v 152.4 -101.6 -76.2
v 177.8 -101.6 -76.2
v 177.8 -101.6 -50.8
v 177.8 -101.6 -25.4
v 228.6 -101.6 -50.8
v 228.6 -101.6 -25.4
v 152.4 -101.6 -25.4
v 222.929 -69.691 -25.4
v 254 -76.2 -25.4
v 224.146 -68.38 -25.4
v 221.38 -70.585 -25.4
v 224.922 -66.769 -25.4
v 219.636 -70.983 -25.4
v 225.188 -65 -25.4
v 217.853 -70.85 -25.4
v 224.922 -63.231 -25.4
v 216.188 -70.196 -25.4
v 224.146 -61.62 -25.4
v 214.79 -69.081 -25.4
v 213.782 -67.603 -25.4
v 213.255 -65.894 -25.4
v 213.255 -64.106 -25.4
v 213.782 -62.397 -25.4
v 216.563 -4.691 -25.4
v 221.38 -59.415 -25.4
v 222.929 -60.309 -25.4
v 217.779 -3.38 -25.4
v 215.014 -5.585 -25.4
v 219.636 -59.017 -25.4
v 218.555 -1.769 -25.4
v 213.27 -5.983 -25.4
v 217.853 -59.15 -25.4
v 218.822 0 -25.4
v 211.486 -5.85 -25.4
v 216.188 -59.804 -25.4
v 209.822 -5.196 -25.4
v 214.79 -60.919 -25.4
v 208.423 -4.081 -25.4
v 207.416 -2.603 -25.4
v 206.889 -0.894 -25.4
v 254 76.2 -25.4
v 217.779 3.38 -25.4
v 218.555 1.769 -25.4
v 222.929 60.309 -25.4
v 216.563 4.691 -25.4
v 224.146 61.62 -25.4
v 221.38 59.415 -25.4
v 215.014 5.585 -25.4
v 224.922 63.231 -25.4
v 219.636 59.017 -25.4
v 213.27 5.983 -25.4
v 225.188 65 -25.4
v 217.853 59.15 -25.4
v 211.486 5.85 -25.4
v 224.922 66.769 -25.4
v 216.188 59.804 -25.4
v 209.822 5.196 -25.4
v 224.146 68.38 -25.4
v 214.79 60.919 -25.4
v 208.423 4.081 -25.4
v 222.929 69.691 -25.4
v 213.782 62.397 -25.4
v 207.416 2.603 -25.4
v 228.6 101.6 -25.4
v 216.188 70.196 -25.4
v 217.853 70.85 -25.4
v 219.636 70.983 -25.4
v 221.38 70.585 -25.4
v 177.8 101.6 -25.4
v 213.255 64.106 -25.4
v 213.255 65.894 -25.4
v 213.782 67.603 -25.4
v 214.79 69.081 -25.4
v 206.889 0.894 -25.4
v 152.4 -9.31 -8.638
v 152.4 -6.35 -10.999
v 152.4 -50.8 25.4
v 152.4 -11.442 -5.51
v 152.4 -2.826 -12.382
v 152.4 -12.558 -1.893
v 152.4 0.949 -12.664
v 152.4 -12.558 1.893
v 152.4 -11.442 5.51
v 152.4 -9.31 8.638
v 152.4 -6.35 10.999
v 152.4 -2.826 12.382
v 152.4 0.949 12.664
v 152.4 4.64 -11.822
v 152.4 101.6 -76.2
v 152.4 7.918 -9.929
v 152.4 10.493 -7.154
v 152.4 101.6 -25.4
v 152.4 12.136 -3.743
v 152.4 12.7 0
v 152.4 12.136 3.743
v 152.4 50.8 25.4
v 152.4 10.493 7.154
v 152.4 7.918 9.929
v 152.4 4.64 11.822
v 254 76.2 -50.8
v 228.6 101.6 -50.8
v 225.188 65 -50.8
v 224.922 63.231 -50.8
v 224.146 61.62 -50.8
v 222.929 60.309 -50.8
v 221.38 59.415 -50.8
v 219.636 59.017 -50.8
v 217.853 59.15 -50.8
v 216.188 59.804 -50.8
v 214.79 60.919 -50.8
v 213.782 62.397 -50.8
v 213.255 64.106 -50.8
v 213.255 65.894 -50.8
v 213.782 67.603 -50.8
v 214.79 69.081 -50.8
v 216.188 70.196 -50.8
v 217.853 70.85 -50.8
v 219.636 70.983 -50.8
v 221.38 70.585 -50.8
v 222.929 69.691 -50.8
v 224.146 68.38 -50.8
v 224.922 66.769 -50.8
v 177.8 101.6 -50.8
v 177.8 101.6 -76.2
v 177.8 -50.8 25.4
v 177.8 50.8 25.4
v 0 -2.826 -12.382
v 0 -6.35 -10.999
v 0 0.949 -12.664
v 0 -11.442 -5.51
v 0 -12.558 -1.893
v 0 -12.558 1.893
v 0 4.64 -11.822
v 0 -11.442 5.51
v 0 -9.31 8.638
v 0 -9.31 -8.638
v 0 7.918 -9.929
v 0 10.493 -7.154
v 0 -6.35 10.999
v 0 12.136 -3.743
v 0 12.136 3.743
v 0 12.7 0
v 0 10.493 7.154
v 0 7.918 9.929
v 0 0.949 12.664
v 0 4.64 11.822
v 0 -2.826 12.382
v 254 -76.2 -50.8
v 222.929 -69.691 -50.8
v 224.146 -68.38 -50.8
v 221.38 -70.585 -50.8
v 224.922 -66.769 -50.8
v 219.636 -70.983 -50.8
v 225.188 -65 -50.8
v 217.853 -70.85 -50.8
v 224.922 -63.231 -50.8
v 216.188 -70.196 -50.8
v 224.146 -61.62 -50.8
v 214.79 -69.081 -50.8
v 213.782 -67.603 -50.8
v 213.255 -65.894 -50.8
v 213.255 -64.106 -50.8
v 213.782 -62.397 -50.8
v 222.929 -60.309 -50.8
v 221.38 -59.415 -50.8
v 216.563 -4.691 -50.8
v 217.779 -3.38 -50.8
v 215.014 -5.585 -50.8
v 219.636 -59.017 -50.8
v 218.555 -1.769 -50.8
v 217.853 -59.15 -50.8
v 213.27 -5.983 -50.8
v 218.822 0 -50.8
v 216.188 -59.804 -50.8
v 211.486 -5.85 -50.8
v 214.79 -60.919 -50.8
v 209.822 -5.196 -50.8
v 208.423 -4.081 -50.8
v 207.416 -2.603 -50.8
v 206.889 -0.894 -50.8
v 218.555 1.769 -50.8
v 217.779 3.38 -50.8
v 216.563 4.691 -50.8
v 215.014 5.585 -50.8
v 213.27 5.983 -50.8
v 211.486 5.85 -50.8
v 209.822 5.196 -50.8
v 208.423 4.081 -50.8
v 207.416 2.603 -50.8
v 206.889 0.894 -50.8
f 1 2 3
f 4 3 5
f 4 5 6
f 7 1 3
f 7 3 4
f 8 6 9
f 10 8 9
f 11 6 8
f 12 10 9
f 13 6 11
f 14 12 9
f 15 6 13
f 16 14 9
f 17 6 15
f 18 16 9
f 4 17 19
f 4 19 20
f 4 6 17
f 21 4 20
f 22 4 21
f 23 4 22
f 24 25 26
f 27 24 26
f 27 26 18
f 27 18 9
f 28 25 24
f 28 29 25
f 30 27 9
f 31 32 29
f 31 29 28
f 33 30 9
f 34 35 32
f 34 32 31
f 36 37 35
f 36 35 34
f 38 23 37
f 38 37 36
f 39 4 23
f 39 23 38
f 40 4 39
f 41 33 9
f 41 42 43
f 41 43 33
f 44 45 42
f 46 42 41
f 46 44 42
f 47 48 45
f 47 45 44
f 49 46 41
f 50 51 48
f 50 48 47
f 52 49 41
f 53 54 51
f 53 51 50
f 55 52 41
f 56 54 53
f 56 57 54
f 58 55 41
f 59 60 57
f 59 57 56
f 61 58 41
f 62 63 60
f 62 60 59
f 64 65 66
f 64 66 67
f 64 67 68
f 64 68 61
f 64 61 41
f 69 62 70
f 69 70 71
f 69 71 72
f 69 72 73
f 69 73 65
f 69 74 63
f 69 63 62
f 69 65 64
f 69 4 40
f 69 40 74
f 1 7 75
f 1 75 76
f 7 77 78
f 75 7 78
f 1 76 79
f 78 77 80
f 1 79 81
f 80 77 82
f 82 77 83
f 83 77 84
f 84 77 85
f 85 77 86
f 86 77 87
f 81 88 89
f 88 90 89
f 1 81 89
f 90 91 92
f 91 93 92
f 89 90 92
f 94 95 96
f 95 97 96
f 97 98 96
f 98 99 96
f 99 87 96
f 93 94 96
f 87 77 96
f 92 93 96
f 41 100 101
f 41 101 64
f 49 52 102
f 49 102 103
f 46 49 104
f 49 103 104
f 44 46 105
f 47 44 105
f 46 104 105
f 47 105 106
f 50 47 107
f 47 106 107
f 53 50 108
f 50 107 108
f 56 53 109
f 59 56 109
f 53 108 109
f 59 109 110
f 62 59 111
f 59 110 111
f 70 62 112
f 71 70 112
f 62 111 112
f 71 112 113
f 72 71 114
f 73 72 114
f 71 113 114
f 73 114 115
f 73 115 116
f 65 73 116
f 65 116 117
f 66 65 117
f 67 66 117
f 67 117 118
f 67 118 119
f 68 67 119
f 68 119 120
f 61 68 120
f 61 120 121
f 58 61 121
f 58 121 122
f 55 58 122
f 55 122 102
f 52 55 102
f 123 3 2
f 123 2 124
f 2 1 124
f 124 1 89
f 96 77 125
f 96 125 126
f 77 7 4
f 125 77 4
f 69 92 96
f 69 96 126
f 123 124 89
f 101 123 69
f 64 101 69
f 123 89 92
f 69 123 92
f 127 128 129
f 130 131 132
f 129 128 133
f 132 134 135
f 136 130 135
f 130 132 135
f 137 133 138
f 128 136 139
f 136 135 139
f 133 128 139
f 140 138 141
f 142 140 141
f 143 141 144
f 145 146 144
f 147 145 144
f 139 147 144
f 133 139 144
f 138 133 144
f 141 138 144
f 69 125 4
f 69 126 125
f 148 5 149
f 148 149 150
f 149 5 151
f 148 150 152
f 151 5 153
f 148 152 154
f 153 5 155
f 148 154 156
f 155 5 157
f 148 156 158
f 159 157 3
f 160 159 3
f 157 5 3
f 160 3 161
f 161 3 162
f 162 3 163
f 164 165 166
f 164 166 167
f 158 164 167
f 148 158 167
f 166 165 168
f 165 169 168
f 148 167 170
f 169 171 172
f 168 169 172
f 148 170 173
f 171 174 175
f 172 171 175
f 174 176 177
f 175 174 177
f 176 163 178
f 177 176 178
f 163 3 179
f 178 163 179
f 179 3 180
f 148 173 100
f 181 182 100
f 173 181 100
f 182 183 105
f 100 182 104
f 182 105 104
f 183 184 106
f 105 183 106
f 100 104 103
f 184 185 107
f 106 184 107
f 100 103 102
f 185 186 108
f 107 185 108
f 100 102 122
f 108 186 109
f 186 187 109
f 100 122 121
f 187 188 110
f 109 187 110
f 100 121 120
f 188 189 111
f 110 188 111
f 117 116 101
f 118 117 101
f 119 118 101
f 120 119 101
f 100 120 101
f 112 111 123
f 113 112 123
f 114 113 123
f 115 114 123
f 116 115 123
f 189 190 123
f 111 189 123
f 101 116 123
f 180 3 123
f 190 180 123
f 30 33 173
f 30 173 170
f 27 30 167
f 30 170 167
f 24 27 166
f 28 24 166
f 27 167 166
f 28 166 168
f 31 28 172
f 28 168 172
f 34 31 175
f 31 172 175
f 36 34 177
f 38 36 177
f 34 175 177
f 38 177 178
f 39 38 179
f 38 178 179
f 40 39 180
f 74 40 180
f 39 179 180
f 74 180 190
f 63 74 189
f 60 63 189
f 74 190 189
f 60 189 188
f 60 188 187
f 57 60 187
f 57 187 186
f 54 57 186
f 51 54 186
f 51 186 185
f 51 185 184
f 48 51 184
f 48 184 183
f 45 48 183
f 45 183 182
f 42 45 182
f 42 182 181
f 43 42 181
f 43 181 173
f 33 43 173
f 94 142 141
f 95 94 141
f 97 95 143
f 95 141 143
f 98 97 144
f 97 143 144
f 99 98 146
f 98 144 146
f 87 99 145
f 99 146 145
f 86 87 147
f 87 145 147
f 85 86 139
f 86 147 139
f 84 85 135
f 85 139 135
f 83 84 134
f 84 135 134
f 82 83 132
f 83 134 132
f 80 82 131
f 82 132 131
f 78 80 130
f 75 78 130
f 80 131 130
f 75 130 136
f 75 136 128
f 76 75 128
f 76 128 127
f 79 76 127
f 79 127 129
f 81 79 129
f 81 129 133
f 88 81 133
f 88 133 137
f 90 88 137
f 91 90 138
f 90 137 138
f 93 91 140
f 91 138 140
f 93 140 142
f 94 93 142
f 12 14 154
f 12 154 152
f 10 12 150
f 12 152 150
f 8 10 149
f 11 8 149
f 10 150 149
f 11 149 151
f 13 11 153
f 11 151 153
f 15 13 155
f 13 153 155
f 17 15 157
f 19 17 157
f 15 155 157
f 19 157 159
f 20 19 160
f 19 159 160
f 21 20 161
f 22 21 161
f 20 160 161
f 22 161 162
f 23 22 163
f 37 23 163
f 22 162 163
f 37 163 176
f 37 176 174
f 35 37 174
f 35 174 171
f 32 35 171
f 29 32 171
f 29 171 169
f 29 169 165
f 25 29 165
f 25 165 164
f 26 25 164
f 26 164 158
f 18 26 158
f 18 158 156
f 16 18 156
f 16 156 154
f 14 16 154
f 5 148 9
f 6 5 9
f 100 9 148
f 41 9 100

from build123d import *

# Parameters (mm, degrees)
F0_R     = 12.7
F1_DEPTH = 152.4
F2_W     = 203.2
F2_H     = 101.6
F3_DEPTH = 25.4
F4_SIZE  = 50.8
F5_W     = 203.2
F5_H     = 25.4
F6_DEPTH = 76.2
F7_SIZE  = 25.4
F8_R     = 6
F9_DEPTH = 76.201


with BuildPart() as f1:
    # F0 (on Right) → F1 (new body)
    with BuildSketch(Plane.YZ):
        Circle(F0_R)
    extrude(amount=F1_DEPTH)

    # F2 (on face) → F3 (join)
    with BuildSketch(Plane.YZ.offset(152.4)):
        with Locations((0, -25.4)):
            Rectangle(F2_W, F2_H)
    extrude(amount=F3_DEPTH)

    # F4
    f4_edges = [f1.edges().sort_by_distance(p)[0] for p in [
        (165.1, 101.6, 25.4),
        (165.1, -101.6, 25.4),
    ]]
    chamfer(f4_edges, length=F4_SIZE)

    # F5 (on face) → F6 (join)
    with BuildSketch(Plane.YZ.offset(177.8)):
        with Locations((0, -38.1)):
            Rectangle(F5_W, F5_H)
    extrude(amount=F6_DEPTH)

    # F7
    f7_edges = [f1.edges().sort_by_distance(p)[0] for p in [
        (254, -101.6, -38.1),
        (254, 101.6, -38.1),
    ]]
    chamfer(f7_edges, length=F7_SIZE)

    # F8 (on face) → F9 (cut, through all)
    with BuildSketch(Plane(origin=(0, 0, -50.8), x_dir=(1, 0, 0), z_dir=(0, 0, -1))):
        with Locations((219.188081, 65)):
            Circle(F8_R)
        with Locations((212.821616, 0)):
            Circle(F8_R)
        with Locations((219.188081, -65)):
            Circle(F8_R)
    extrude(amount=-F9_DEPTH, mode=Mode.SUBTRACT)


solid = f1.part
